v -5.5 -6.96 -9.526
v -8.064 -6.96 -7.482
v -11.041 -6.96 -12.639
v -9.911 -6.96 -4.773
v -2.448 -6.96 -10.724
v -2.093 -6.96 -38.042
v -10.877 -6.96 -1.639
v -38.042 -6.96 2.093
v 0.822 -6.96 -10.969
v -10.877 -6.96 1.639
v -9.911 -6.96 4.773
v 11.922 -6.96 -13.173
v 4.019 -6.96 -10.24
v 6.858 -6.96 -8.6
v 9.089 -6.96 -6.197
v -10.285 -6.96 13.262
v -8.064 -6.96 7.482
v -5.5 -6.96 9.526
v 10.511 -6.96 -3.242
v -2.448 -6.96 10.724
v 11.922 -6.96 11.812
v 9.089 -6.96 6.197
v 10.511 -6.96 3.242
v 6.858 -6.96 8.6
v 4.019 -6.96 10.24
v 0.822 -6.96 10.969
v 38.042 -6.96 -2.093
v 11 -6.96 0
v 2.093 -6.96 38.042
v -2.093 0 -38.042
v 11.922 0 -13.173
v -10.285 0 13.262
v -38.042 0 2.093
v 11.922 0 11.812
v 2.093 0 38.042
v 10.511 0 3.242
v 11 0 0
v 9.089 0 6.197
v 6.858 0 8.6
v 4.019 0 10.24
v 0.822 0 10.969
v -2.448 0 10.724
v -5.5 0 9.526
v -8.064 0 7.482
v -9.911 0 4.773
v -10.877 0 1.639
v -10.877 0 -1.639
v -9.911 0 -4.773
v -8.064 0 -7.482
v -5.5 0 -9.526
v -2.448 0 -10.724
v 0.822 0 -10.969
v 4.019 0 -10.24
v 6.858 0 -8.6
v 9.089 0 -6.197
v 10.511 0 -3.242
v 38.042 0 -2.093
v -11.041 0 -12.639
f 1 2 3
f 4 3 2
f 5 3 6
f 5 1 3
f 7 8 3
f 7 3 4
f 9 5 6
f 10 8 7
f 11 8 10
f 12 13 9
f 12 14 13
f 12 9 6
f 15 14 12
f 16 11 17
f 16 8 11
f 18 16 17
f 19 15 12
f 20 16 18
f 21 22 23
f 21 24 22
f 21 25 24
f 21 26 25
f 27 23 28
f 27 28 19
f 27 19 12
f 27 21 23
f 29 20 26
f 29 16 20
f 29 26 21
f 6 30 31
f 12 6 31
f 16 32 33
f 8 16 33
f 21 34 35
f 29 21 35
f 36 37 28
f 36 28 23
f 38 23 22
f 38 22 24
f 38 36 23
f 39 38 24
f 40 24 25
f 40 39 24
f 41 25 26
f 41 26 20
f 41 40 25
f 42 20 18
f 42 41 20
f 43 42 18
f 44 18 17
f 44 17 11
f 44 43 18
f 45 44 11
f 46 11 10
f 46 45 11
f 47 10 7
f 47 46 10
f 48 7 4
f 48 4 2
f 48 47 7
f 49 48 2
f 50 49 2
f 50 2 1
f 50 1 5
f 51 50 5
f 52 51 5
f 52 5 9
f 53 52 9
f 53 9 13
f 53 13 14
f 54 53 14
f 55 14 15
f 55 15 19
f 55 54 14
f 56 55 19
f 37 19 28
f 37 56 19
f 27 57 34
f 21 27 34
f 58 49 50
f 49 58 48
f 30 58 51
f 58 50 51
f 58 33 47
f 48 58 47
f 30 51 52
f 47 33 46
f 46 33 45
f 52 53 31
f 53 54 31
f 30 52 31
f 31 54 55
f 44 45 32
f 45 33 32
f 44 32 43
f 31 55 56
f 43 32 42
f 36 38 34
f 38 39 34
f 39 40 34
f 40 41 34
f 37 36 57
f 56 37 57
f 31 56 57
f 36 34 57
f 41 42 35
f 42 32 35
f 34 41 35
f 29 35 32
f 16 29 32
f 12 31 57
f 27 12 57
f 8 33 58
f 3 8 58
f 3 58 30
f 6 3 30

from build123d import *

# Parameters (mm, degrees)
F0_R     = 11
F1_DEPTH = 6.96
F2_DEPTH = 6.96


with BuildPart() as f1:
    # F0 (on Front) → F1 (new body)
    with BuildSketch(Plane.XZ):
        Circle(F0_R)
        with BuildLine():
            ThreePointArc((-0.086483, 0.004757), (-0.057789, 0.064517), (0.004757, 0.086483))
            Line((0.004757, 0.086483), (0.002379, 0.043242))
            ThreePointArc((0.002379, 0.043242), (0.031452, 0.02977), (0.043307, 0))
            ThreePointArc((0.043307, 0), (0.043291, -0.00119), (0.043242, -0.002379))
            ThreePointArc((0.043242, -0.002379), (0.028895, -0.032258), (-0.002379, -0.043242))
            ThreePointArc((-0.002379, -0.043242), (-0.032258, -0.028895), (-0.043242, 0.002379))
            Line((-0.043242, 0.002379), (-0.086483, 0.004757))
        make_face(mode=Mode.SUBTRACT)
        Polygon((11.922232, 11.811606), (2.092604, 38.042489), (-10.284935, 13.26174), (-38.042489, 2.092604), (-11.041482, -12.638802), (-2.092604, -38.042489), (11.922232, -13.172698), (38.042489, -2.092604), align=None)
        Circle(F0_R, mode=Mode.SUBTRACT)
    extrude(amount=F1_DEPTH)

    # F0 (on Front) → F2 (join)
    with BuildSketch(Plane.XZ):
        Circle(F0_R)
        with BuildLine():
            ThreePointArc((-0.086483, 0.004757), (-0.057789, 0.064517), (0.004757, 0.086483))
            Line((0.004757, 0.086483), (0.002379, 0.043242))
            ThreePointArc((0.002379, 0.043242), (0.031452, 0.02977), (0.043307, 0))
            ThreePointArc((0.043307, 0), (0.043291, -0.00119), (0.043242, -0.002379))
            ThreePointArc((0.043242, -0.002379), (0.028895, -0.032258), (-0.002379, -0.043242))
            ThreePointArc((-0.002379, -0.043242), (-0.032258, -0.028895), (-0.043242, 0.002379))
            Line((-0.043242, 0.002379), (-0.086483, 0.004757))
        make_face(mode=Mode.SUBTRACT)
        Polygon((11.922232, 11.811606), (2.092604, 38.042489), (-10.284935, 13.26174), (-38.042489, 2.092604), (-11.041482, -12.638802), (-2.092604, -38.042489), (11.922232, -13.172698), (38.042489, -2.092604), align=None)
        Circle(F0_R, mode=Mode.SUBTRACT)
    extrude(amount=F2_DEPTH)


solid = f1.part
